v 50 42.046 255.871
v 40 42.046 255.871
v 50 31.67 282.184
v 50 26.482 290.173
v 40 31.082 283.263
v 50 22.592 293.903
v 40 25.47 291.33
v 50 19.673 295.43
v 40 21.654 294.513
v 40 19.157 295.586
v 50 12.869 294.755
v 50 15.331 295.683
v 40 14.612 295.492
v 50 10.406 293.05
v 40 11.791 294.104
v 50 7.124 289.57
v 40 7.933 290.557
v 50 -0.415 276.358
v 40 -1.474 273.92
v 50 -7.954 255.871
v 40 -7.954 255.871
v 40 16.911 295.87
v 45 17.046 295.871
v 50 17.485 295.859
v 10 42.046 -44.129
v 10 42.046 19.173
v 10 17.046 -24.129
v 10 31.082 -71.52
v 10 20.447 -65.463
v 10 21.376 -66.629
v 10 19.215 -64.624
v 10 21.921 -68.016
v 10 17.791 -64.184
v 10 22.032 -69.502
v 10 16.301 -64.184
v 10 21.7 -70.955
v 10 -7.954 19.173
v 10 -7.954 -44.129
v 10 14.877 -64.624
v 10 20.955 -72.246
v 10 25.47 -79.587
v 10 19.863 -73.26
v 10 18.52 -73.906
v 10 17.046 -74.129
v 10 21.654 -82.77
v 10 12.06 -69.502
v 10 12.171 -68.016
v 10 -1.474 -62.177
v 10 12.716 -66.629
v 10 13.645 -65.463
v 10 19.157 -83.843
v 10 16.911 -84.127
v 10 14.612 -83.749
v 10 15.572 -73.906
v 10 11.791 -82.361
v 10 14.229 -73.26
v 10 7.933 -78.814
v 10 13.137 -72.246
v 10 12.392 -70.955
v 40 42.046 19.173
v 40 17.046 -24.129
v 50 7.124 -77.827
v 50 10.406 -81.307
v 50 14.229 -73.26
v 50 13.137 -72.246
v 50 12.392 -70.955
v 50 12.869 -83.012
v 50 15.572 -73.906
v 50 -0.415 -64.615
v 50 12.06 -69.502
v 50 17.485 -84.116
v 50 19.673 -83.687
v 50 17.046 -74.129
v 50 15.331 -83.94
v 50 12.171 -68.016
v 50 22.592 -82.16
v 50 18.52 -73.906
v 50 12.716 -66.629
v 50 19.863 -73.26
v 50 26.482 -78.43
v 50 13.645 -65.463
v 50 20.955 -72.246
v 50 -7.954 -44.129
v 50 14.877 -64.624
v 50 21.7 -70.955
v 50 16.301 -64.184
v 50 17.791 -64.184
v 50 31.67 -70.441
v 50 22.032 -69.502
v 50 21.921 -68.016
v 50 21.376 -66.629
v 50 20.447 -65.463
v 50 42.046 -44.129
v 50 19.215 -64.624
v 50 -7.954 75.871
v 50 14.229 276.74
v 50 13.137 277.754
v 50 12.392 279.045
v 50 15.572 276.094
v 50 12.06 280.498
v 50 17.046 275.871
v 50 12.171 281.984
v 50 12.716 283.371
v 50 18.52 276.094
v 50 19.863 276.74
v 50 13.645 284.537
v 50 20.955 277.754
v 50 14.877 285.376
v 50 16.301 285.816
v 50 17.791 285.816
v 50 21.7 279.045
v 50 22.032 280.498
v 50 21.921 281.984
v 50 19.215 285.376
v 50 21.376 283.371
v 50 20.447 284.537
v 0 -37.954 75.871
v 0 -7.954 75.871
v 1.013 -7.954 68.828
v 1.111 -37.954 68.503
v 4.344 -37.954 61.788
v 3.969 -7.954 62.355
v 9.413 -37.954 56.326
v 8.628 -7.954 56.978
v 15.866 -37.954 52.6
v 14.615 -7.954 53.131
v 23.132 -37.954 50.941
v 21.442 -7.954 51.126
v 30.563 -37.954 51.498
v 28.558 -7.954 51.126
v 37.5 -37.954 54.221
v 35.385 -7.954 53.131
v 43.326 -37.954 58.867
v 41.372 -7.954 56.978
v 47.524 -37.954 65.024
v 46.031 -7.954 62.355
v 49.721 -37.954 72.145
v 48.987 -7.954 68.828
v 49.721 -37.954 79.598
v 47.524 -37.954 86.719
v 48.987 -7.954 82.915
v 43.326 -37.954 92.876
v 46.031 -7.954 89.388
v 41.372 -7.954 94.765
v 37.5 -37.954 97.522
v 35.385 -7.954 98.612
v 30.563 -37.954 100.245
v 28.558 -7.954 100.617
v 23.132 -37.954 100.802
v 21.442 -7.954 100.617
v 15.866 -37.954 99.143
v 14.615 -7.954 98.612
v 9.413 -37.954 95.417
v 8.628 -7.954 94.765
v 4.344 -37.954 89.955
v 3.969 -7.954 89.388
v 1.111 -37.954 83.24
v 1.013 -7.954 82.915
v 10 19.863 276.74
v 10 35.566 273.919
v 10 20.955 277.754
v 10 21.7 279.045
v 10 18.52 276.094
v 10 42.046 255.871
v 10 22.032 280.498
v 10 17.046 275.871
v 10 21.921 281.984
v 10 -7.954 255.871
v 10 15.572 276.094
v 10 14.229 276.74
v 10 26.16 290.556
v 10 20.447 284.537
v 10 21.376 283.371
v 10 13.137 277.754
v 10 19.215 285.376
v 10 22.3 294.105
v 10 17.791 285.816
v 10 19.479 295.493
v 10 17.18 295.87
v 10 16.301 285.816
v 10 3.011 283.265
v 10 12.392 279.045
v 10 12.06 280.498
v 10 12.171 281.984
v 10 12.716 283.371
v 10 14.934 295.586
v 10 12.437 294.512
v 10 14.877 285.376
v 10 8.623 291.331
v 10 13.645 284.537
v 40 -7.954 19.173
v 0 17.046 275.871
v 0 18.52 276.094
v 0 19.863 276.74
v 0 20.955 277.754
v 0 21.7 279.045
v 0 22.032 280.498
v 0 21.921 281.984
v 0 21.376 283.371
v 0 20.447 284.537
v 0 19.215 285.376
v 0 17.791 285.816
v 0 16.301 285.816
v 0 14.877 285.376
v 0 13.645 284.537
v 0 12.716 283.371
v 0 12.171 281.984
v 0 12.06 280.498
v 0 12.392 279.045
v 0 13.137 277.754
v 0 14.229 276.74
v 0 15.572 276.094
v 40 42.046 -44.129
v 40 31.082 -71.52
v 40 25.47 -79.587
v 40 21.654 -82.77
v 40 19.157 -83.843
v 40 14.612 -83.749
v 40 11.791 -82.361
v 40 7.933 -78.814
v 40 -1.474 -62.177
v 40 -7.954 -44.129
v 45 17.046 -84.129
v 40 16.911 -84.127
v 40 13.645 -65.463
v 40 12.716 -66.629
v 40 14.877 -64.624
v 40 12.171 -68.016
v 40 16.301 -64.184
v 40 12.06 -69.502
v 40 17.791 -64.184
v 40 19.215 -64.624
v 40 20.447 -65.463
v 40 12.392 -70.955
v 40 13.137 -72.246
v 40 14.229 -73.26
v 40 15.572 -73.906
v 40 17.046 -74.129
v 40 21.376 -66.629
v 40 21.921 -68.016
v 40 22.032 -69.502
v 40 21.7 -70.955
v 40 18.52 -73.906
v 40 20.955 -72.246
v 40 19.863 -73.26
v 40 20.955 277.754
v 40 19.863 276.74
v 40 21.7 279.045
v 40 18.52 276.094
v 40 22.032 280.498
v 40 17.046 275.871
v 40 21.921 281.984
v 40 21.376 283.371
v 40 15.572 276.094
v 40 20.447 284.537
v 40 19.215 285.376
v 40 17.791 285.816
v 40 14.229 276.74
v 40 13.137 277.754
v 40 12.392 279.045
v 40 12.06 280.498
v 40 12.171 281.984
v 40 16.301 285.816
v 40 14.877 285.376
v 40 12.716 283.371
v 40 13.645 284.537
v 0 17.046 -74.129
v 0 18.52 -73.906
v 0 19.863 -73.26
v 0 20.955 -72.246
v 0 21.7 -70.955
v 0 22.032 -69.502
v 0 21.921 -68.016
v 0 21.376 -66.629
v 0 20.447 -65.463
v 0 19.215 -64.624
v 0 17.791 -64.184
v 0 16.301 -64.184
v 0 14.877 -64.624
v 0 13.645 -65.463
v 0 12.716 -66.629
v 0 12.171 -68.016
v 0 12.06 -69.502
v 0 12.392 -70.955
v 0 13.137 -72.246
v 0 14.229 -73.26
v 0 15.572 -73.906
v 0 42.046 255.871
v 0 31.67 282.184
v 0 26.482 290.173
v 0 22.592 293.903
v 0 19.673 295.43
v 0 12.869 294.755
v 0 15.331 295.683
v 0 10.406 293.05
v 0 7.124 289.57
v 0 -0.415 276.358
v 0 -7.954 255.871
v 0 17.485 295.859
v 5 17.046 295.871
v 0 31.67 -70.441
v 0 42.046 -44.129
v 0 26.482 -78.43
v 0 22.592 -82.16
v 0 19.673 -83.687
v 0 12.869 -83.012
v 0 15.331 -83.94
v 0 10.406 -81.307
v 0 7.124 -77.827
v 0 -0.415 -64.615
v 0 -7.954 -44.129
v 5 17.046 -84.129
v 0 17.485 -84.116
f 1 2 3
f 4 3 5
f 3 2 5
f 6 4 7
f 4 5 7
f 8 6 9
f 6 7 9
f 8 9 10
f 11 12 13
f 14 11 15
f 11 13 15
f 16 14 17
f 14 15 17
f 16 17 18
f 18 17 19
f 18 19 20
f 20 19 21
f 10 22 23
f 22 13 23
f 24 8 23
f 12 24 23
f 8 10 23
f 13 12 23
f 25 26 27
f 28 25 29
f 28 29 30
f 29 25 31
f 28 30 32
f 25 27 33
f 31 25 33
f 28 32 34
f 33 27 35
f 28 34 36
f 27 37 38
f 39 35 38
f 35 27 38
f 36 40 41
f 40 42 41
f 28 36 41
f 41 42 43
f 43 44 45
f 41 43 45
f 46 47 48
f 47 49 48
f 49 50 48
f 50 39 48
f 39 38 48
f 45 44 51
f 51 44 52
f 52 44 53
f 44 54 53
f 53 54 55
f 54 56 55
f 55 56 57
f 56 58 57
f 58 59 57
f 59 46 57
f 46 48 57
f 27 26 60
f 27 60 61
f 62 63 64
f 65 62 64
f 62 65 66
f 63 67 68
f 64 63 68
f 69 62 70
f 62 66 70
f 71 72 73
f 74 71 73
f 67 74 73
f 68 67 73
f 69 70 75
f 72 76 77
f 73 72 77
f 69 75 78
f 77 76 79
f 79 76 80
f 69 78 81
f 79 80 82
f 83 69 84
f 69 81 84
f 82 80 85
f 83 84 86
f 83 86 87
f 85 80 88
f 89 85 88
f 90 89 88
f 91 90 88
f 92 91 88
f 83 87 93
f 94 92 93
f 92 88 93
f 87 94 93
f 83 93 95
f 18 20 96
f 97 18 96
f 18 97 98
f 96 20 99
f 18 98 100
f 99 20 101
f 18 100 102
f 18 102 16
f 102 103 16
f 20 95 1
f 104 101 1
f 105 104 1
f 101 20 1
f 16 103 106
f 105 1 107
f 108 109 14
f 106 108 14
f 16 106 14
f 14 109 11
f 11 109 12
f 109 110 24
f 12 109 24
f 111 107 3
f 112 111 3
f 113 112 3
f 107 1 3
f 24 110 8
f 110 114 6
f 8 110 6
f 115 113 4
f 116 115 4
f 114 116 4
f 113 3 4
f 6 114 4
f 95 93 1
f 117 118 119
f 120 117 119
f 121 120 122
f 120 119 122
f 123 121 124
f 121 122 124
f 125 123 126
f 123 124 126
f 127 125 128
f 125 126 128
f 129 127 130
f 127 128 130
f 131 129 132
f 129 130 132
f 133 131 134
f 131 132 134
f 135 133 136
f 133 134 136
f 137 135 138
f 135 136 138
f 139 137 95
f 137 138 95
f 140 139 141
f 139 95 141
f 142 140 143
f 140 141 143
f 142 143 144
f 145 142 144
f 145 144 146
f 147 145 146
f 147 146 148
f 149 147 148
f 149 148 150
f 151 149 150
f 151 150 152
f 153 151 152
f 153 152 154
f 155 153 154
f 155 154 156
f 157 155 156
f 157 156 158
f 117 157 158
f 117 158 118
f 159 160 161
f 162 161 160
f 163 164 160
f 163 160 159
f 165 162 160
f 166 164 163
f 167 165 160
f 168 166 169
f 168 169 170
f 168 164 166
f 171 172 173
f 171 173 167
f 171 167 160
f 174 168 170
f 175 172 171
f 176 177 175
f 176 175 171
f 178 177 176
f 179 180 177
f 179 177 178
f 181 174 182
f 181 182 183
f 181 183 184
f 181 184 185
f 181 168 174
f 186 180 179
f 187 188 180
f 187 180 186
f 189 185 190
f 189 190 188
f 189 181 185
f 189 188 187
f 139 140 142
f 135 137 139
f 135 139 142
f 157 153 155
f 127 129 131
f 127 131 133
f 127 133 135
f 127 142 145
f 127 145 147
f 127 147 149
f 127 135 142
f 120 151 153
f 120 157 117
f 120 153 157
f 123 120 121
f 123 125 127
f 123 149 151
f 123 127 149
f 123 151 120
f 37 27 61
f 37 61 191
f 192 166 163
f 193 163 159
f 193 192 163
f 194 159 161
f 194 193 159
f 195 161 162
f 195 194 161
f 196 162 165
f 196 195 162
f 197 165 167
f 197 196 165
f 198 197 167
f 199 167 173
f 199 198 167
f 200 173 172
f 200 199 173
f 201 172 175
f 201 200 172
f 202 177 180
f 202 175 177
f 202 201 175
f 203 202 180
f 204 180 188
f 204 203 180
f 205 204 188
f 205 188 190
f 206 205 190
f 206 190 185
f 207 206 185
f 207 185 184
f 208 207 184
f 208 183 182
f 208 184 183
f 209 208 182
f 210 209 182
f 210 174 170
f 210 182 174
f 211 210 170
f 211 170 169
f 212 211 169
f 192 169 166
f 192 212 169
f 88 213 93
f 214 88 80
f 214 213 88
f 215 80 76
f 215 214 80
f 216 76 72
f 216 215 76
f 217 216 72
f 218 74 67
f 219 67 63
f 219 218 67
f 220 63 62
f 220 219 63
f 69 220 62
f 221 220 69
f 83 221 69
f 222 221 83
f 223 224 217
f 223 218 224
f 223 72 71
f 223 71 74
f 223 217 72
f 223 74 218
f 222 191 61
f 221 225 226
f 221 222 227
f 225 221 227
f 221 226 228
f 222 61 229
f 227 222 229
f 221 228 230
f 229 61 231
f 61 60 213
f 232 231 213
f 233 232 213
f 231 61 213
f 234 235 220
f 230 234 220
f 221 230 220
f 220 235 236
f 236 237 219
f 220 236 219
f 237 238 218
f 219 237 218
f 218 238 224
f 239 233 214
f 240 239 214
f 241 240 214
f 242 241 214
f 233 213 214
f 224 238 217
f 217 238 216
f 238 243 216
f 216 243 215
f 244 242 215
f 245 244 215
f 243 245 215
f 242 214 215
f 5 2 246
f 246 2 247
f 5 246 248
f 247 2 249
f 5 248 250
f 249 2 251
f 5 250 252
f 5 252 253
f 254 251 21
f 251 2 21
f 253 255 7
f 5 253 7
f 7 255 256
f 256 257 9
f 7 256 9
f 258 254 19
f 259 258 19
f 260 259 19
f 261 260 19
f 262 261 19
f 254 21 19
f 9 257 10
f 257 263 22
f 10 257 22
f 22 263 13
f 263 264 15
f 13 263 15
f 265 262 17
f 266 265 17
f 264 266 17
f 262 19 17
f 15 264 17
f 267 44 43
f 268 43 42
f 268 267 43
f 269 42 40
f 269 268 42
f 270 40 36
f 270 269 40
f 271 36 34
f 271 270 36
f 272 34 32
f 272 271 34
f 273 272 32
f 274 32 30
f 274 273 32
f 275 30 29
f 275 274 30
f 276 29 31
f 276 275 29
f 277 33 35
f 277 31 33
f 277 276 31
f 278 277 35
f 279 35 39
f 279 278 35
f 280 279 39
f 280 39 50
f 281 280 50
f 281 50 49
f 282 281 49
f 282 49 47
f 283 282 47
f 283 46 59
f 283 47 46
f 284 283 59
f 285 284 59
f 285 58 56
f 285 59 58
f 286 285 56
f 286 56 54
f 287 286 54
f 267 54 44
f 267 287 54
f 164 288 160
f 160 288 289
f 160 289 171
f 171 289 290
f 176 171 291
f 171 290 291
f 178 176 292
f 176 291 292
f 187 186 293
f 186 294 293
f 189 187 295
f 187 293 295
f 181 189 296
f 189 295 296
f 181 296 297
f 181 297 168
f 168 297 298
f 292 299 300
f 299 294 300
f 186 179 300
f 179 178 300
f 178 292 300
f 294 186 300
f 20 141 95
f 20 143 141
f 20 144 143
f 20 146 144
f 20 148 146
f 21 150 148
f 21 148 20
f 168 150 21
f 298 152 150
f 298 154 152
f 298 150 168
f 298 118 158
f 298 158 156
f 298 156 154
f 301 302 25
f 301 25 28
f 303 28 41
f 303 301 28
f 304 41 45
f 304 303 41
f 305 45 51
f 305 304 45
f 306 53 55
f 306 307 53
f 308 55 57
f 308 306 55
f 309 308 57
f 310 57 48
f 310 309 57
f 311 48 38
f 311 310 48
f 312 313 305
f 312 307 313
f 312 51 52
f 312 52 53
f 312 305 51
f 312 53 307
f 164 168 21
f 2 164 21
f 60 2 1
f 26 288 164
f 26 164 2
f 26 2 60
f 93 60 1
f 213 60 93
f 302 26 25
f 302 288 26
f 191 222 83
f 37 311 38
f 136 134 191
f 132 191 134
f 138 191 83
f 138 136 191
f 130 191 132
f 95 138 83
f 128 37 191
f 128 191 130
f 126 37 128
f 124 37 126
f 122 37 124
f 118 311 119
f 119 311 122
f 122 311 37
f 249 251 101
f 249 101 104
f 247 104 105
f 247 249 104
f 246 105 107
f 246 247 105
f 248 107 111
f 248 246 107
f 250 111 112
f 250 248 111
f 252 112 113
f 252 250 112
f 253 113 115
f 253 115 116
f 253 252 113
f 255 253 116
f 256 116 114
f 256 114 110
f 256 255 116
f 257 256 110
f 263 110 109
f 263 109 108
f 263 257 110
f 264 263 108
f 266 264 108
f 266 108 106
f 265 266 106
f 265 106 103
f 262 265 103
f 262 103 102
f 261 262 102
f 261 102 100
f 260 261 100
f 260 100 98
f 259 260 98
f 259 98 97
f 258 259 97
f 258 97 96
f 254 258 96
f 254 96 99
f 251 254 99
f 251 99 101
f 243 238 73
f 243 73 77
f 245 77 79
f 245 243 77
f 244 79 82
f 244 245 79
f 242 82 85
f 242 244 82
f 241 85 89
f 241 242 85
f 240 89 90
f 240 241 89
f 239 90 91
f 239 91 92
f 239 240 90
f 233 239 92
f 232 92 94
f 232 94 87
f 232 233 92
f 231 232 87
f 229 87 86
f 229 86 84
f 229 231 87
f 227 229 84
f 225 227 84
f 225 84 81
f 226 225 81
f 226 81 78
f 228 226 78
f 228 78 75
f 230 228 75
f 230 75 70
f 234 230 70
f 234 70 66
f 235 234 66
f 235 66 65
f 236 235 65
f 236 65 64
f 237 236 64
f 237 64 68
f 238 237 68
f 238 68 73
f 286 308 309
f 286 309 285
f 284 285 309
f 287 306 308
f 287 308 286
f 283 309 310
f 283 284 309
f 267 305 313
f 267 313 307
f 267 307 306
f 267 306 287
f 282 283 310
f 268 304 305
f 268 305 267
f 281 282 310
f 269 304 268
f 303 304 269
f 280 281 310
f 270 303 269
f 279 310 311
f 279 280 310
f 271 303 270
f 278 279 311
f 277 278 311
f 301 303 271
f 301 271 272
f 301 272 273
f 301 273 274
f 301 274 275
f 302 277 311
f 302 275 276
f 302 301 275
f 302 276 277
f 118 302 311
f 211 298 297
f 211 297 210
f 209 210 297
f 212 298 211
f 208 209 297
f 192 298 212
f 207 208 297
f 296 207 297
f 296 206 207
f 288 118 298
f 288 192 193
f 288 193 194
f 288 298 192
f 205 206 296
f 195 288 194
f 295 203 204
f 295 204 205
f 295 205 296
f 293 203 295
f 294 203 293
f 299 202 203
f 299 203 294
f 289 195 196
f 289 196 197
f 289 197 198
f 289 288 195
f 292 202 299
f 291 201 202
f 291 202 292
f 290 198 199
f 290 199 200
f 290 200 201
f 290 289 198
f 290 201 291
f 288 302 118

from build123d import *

# Parameters (mm, degrees)
SKETCH1_R               = 5
BOSS_EXTRUDE1_DEPTH     = 50
CUT_EXTRUDE1_DEPTH      = 52
CUT_EXTRUDE1_DEPTH_BACK = 35
SKETCH2_W               = 30
SKETCH2_H               = 60
SKETCH3_W               = 30
SKETCH3_H               = 40
CUT_EXTRUDE2_DEPTH      = 52
CUT_EXTRUDE3_START      = -10
CUT_EXTRUDE3_DEPTH      = 30
CUT_EXTRUDE4_START      = -10
CUT_EXTRUDE4_DEPTH      = 30
SKETCH6_R               = 25
BOSS_EXTRUDE2_DEPTH     = 30


with BuildPart() as part:
    # Sketch1 → Boss-Extrude1 (new body)
    with BuildSketch(Plane(origin=(0, 0, 0), x_dir=(0, 0, -1), z_dir=(1, 0, 0))):
        with BuildLine():
            Line((-255.87149894, 42.046001407), (44.12850106, 42.046001407))
            add(Edge.make_bspline(
                [(44.12850106, 42.046001407), (124.12850106, 17.046001407), (44.12850106, -7.953998593)],
                knots=[0, 0, 0, 1, 1, 1], degree=2))
            Line((44.12850106, -7.953998593), (-255.87149894, -7.953998593))
            add(Edge.make_bspline(
                [(-255.87149894, 42.046001407), (-335.87149894, 17.046001407), (-255.87149894, -7.953998593)],
                knots=[0, 0, 0, 1, 1, 1], degree=2))
        make_face()
        with Locations((-280.87149894, 17.046001407)):
            Circle(SKETCH1_R, mode=Mode.SUBTRACT)
        with Locations((69.12850106, 17.046001407)):
            Circle(SKETCH1_R, mode=Mode.SUBTRACT)
    extrude(amount=BOSS_EXTRUDE1_DEPTH)

    # Sketch2 → Cut-Extrude1 (cut, two sides: drawn at the far end of the back side and taken through both)
    with BuildSketch(Plane(origin=(0, 0, 0), x_dir=(1, 0, 0), z_dir=(0, 1, 0)).offset(-CUT_EXTRUDE1_DEPTH_BACK)):
        with Locations((25, 54.12850106)):
            Rectangle(SKETCH2_W, SKETCH2_H)
    extrude(amount=CUT_EXTRUDE1_DEPTH + CUT_EXTRUDE1_DEPTH_BACK, mode=Mode.SUBTRACT)

    # Sketch3 → Cut-Extrude2 (cut)
    with BuildSketch(Plane.XZ.offset(7.953998593)):
        with Locations((25, 275.87149894)):
            Rectangle(SKETCH3_W, SKETCH3_H)
    extrude(amount=-CUT_EXTRUDE2_DEPTH, mode=Mode.SUBTRACT)

    # Sketch4 → Cut-Extrude3 (cut)
    with BuildSketch(Plane.ZY.offset(CUT_EXTRUDE3_START)):
        Polygon((-24.12850106, 17.046001407), (-24.12850106, 42.046001407), (19.172769129, 42.046001407), align=None)
    extrude(amount=-CUT_EXTRUDE3_DEPTH, mode=Mode.SUBTRACT)

    # Sketch5 → Cut-Extrude4 (cut)
    with BuildSketch(Plane.ZY.offset(CUT_EXTRUDE4_START)):
        Polygon((-24.12850106, -7.953998593), (-24.12850106, 17.046001407), (19.172769129, -7.953998593), align=None)
    extrude(amount=-CUT_EXTRUDE4_DEPTH, mode=Mode.SUBTRACT)

    # Sketch6 → Boss-Extrude2 (add)
    with BuildSketch(Plane.XZ.offset(7.953998593)):
        with Locations(Location((25, 75.87149894, 0), (0, 0, 180))):
            Circle(SKETCH6_R)
    extrude(amount=BOSS_EXTRUDE2_DEPTH)


solid = part.part
